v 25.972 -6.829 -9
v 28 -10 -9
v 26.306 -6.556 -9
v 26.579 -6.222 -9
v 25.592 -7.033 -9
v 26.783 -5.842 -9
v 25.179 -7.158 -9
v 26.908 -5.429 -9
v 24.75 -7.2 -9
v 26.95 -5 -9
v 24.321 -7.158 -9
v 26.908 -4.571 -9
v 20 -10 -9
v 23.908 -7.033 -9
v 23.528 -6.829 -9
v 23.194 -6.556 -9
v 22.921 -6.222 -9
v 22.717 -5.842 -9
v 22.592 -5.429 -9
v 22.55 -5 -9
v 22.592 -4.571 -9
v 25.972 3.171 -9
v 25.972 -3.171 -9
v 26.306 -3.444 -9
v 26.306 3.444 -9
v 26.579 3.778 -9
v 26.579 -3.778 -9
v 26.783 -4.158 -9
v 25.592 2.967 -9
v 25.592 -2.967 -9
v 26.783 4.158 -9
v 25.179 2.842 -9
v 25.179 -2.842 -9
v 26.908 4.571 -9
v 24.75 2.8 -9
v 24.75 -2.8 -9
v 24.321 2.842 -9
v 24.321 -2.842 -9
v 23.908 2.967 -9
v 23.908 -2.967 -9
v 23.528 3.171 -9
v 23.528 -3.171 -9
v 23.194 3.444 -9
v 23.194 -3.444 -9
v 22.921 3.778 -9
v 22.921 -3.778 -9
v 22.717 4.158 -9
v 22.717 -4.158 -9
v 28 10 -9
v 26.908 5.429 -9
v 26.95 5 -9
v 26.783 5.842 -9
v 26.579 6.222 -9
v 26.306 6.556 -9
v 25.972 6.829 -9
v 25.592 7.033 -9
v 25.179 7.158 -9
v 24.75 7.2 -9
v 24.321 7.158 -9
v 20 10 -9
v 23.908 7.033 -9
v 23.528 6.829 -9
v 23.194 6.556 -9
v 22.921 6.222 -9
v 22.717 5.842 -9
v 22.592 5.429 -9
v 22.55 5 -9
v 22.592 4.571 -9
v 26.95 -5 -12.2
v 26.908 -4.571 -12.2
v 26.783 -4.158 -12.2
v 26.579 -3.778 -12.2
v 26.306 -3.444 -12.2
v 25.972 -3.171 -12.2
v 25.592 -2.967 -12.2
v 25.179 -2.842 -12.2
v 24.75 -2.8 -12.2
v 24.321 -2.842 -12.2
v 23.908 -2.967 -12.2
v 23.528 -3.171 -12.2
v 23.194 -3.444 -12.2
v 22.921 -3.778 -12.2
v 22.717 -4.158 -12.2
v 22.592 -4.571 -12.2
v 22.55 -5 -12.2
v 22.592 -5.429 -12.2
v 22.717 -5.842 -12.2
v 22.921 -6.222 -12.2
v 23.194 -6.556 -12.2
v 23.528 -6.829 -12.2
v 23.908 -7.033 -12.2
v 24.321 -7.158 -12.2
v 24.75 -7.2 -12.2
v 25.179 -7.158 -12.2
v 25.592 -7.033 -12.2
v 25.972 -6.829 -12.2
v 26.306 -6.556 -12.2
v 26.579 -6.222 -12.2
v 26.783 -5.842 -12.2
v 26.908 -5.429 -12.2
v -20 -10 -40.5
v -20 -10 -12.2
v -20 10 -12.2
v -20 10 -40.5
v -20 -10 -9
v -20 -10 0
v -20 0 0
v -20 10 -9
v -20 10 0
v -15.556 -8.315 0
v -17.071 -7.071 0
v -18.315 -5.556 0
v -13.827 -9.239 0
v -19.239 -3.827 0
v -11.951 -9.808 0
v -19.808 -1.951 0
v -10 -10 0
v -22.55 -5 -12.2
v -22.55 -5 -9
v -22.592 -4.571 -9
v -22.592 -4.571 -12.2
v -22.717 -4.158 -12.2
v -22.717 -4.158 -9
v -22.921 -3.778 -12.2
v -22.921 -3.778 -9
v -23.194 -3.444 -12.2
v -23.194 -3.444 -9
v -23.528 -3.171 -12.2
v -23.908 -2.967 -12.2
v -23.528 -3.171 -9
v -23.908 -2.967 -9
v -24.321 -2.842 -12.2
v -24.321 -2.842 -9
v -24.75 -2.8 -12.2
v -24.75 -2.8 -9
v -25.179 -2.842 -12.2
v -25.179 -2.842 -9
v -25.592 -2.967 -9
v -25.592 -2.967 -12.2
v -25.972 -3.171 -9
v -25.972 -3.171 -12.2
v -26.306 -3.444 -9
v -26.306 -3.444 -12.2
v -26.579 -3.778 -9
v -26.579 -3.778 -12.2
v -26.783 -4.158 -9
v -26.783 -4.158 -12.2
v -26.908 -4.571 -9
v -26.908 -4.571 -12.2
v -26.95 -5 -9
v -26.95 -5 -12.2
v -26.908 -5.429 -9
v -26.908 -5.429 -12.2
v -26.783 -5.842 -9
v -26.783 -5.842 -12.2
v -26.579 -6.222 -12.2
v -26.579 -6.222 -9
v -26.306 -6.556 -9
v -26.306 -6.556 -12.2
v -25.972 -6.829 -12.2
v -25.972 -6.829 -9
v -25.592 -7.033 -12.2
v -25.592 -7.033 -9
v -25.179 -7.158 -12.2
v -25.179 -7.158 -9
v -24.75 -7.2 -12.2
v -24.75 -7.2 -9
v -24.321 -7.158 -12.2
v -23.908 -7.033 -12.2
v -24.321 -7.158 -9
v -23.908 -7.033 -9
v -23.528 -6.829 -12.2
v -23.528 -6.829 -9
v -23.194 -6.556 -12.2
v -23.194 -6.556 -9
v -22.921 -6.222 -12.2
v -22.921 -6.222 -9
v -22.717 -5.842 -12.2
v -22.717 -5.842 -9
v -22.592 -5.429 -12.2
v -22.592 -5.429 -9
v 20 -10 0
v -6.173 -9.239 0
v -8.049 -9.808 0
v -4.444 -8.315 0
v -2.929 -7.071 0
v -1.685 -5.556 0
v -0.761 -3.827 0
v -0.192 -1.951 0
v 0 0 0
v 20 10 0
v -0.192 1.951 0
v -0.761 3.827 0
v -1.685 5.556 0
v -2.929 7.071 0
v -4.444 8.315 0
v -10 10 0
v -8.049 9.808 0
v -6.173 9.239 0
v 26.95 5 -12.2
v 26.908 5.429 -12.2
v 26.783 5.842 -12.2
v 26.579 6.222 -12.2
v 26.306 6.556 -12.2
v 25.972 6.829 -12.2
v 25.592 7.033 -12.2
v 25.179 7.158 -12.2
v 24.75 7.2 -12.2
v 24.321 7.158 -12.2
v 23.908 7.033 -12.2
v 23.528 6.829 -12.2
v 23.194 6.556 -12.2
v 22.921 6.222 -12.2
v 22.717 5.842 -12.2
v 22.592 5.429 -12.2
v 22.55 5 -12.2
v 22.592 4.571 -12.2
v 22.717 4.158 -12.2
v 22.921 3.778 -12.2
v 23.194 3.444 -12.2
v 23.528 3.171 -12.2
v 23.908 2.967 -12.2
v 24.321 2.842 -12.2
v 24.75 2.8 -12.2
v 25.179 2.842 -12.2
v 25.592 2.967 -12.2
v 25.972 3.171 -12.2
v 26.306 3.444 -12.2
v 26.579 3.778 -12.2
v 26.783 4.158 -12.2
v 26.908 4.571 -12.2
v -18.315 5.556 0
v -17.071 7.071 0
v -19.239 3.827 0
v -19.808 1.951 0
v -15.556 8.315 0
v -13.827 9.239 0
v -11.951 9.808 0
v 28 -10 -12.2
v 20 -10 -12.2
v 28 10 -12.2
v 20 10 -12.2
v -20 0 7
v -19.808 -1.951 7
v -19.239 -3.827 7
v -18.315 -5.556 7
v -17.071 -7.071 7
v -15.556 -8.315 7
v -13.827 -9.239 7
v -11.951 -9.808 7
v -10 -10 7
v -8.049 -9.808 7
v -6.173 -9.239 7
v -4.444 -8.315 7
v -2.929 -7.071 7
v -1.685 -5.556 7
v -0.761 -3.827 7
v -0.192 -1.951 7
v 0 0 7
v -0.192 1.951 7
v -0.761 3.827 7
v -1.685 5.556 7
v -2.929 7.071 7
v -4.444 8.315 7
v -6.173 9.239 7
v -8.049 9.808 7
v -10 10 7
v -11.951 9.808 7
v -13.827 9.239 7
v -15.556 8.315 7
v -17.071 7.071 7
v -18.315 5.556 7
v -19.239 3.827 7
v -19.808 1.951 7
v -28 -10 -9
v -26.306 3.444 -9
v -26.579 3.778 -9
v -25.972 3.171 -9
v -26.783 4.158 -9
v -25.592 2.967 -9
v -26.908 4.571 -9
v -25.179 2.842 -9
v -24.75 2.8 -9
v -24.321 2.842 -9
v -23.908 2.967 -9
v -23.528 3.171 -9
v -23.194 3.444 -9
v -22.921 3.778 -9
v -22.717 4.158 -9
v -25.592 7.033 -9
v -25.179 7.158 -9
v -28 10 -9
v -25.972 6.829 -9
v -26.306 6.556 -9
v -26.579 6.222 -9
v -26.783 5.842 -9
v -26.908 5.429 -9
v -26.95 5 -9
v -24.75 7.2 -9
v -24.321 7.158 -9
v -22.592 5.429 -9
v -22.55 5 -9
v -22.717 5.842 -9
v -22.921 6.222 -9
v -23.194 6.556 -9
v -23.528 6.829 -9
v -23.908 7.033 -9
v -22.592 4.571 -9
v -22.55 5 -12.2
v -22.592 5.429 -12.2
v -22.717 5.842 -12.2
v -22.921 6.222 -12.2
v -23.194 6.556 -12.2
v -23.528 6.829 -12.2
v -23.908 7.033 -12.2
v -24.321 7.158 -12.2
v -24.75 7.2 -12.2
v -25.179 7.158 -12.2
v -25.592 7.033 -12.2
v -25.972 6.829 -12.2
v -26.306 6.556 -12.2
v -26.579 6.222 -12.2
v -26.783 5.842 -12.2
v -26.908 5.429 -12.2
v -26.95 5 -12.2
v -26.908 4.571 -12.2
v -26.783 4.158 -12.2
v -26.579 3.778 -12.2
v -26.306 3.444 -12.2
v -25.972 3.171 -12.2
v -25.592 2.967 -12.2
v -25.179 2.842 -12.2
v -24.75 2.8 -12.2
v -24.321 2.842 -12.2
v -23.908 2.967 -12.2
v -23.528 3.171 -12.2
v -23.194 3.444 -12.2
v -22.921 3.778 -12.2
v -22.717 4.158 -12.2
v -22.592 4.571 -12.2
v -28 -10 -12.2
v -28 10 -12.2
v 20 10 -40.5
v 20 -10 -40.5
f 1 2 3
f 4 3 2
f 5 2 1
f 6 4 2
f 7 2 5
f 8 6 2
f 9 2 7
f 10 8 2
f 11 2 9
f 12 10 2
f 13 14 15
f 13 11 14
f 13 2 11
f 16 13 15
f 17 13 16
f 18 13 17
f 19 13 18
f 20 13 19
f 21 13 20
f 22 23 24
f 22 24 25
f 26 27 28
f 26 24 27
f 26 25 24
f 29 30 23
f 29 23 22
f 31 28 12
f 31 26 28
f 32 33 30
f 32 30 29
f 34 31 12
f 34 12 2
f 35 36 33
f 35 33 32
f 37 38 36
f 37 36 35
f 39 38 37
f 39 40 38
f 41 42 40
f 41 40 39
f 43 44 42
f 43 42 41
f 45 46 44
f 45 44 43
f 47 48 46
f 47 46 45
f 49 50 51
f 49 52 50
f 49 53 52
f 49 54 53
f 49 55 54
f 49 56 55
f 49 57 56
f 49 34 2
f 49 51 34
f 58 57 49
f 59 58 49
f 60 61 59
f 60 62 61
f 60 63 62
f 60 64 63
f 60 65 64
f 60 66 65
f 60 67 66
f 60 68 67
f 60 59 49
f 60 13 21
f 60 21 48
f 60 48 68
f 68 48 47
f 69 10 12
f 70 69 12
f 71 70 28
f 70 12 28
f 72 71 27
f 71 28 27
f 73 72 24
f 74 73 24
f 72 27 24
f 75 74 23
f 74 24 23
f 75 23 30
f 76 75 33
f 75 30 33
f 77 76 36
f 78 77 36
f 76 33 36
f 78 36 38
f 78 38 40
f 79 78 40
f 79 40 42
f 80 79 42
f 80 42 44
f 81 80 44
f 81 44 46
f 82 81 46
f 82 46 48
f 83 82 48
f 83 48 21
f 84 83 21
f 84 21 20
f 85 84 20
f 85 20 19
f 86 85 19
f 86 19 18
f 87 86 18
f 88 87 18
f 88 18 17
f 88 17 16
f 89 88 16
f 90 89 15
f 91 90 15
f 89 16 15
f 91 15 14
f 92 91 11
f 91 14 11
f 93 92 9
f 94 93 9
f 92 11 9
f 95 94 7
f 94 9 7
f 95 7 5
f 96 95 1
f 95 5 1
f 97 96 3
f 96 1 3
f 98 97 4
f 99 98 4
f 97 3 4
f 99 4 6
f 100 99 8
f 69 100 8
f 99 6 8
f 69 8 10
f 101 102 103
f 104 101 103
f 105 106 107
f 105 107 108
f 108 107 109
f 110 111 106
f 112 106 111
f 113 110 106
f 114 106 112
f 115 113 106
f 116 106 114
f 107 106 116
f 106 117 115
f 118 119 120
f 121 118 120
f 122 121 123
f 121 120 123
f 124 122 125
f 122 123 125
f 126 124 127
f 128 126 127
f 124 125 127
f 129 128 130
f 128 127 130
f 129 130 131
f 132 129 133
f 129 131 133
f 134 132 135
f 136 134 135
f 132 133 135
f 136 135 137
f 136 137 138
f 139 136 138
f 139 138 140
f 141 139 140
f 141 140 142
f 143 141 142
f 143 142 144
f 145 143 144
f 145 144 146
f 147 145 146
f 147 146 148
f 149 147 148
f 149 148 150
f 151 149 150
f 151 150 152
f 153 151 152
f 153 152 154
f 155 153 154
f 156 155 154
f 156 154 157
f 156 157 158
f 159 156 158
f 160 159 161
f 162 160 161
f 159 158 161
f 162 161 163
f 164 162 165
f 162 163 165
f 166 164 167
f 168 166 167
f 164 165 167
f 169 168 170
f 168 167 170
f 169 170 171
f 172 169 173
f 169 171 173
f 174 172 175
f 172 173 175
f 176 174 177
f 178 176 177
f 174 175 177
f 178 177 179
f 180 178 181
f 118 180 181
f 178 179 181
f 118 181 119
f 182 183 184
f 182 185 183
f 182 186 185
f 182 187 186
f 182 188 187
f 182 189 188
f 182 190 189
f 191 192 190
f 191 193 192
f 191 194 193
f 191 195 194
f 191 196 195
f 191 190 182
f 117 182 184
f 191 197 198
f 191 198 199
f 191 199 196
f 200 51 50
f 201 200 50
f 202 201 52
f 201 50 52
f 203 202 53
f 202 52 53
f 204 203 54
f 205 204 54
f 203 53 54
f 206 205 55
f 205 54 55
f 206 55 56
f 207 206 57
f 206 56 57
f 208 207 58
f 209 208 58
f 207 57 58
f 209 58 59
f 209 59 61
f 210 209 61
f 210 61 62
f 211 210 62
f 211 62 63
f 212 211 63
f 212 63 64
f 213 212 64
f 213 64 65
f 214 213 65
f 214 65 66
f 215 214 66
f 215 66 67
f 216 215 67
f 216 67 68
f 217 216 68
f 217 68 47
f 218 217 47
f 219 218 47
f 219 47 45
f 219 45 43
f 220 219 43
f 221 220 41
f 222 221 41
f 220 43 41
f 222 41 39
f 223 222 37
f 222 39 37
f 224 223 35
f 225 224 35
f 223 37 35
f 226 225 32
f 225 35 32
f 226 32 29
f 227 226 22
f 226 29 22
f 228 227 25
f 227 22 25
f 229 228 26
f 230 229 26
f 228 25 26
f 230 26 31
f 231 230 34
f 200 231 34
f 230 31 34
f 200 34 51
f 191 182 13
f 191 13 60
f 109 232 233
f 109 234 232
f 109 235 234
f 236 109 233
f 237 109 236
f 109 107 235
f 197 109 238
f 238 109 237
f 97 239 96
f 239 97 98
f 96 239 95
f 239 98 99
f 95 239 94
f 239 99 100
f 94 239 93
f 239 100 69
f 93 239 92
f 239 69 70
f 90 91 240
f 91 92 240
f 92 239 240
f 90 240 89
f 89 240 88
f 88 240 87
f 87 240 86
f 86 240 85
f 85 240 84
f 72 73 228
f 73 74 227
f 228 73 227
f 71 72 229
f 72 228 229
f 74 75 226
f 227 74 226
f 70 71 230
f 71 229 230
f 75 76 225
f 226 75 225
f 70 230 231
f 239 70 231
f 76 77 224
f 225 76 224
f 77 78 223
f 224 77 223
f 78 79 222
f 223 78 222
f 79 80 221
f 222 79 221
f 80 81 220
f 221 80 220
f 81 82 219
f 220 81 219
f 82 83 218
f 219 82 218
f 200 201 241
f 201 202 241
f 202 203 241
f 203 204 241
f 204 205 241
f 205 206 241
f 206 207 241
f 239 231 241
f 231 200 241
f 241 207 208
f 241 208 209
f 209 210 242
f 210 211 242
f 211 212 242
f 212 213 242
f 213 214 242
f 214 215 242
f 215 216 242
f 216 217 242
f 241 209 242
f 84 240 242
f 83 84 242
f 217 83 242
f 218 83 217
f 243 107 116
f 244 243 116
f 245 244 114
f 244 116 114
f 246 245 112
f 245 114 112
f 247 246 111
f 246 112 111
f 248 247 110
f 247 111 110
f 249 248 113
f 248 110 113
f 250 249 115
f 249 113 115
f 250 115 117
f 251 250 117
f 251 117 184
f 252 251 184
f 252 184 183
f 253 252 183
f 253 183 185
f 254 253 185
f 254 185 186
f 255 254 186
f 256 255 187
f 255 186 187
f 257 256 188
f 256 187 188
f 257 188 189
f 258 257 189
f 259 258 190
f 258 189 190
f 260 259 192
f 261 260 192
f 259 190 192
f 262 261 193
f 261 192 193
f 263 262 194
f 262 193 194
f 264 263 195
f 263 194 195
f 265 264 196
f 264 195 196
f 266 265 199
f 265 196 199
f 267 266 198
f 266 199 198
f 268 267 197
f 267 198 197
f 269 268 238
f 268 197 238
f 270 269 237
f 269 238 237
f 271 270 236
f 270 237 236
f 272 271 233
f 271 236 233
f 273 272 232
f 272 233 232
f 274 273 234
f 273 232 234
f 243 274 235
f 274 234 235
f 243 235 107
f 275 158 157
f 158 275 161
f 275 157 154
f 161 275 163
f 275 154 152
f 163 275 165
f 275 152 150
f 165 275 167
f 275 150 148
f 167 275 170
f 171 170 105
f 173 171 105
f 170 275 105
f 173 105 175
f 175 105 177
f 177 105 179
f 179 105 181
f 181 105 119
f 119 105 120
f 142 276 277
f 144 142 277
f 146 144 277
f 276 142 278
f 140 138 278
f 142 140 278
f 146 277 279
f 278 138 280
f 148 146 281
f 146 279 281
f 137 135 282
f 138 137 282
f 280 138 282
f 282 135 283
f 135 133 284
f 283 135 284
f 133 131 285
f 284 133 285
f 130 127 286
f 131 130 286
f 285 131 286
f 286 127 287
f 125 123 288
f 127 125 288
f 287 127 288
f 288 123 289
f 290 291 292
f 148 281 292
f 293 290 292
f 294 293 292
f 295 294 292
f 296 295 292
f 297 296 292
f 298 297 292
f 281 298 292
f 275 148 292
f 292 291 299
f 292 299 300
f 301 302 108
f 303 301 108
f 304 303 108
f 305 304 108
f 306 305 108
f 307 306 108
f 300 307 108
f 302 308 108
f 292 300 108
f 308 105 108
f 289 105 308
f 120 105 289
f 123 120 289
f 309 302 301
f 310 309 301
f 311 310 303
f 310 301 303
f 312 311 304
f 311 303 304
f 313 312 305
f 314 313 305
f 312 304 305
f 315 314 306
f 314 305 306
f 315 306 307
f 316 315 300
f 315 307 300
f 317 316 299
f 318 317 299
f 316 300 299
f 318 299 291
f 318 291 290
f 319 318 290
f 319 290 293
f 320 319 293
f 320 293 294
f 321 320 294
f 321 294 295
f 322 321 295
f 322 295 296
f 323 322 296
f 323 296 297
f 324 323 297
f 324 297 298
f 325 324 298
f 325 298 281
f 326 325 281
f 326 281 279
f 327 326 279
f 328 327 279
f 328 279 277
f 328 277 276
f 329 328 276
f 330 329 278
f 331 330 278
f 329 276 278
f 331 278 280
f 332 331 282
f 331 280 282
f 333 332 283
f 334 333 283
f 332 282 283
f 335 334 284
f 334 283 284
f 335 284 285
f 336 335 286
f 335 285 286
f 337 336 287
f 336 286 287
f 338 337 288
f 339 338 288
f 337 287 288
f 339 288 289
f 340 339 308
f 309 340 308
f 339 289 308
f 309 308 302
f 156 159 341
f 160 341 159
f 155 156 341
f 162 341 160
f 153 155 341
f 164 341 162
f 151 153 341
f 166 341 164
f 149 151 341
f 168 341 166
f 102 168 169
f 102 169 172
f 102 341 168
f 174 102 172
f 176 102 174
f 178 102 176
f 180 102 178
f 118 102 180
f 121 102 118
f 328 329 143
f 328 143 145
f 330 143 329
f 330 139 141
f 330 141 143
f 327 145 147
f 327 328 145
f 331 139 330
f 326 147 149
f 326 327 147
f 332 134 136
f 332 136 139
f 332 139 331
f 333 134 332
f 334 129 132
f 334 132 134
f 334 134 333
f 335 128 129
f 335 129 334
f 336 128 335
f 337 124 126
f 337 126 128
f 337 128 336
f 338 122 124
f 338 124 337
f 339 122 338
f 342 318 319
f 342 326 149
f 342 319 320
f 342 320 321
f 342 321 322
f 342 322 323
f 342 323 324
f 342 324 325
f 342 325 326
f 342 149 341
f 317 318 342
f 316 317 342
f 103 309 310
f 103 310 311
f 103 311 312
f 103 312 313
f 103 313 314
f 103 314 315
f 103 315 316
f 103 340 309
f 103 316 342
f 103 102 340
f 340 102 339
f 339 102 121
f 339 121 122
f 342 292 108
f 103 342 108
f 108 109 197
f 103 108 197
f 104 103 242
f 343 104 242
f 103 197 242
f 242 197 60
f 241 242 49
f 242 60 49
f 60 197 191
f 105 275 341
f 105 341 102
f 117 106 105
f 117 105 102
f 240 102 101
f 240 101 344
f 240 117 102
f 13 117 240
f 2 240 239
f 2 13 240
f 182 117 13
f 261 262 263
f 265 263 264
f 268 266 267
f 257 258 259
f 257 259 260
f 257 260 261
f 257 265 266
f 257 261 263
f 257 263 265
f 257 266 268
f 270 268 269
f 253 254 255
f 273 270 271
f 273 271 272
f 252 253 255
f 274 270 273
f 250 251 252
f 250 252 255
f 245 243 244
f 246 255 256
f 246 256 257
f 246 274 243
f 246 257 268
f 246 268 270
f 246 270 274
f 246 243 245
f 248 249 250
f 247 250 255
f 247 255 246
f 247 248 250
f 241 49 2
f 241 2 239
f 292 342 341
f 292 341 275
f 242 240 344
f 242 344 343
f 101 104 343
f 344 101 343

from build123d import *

# Parameters (mm, degrees)
SKETCH1_W           = 40
SKETCH1_H           = 20
BOSS_EXTRUDE1_DEPTH = 40.5
SKETCH2_R           = 10
BOSS_EXTRUDE2_DEPTH = 7
SKETCH3_W           = 3.2
SKETCH3_H           = 20
BOSS_EXTRUDE3_DEPTH = 8
SKETCH4_W           = 3.2
SKETCH4_H           = 20
BOSS_EXTRUDE4_DEPTH = 8
SKETCH6_R           = 2.2
CUT_EXTRUDE1_DEPTH  = 8
SKETCH8_R           = 2.2
CUT_EXTRUDE3_DEPTH  = 8


with BuildPart() as part:
    # Sketch1 → Boss-Extrude1 (new body)
    with BuildSketch(Plane.XY):
        Rectangle(SKETCH1_W, SKETCH1_H)
    extrude(amount=-BOSS_EXTRUDE1_DEPTH)

    # Sketch2 → Boss-Extrude2 (add)
    with BuildSketch(Plane.XY):
        with Locations(Location((-10, 0, 0), (0, 0, 180))):
            Circle(SKETCH2_R)
    extrude(amount=BOSS_EXTRUDE2_DEPTH)

    # Sketch3 → Boss-Extrude3 (add)
    with BuildSketch(Plane.ZY.offset(20)):
        with Locations((-10.6, 0)):
            Rectangle(SKETCH3_W, SKETCH3_H)
    extrude(amount=BOSS_EXTRUDE3_DEPTH)

    # Sketch4 → Boss-Extrude4 (add)
    with BuildSketch(Plane(origin=(20, 0, 0), x_dir=(0, 0, -1), z_dir=(1, 0, 0))):
        with Locations((10.6, 0)):
            Rectangle(SKETCH4_W, SKETCH4_H)
    extrude(amount=BOSS_EXTRUDE4_DEPTH)

    # Sketch6 → Cut-Extrude1 (cut)
    with BuildSketch(Plane.XY.offset(-9)):
        with Locations((-24.75, 5)):
            Circle(SKETCH6_R)
        with Locations((-24.75, -5)):
            Circle(SKETCH6_R)
    extrude(amount=-CUT_EXTRUDE1_DEPTH, mode=Mode.SUBTRACT)

    # Sketch8 → Cut-Extrude3 (cut)
    with BuildSketch(Plane.XY.offset(-9)):
        with Locations((24.75, 5)):
            Circle(SKETCH8_R)
        with Locations((24.75, -5)):
            Circle(SKETCH8_R)
    extrude(amount=-CUT_EXTRUDE3_DEPTH, mode=Mode.SUBTRACT)


solid = part.part
